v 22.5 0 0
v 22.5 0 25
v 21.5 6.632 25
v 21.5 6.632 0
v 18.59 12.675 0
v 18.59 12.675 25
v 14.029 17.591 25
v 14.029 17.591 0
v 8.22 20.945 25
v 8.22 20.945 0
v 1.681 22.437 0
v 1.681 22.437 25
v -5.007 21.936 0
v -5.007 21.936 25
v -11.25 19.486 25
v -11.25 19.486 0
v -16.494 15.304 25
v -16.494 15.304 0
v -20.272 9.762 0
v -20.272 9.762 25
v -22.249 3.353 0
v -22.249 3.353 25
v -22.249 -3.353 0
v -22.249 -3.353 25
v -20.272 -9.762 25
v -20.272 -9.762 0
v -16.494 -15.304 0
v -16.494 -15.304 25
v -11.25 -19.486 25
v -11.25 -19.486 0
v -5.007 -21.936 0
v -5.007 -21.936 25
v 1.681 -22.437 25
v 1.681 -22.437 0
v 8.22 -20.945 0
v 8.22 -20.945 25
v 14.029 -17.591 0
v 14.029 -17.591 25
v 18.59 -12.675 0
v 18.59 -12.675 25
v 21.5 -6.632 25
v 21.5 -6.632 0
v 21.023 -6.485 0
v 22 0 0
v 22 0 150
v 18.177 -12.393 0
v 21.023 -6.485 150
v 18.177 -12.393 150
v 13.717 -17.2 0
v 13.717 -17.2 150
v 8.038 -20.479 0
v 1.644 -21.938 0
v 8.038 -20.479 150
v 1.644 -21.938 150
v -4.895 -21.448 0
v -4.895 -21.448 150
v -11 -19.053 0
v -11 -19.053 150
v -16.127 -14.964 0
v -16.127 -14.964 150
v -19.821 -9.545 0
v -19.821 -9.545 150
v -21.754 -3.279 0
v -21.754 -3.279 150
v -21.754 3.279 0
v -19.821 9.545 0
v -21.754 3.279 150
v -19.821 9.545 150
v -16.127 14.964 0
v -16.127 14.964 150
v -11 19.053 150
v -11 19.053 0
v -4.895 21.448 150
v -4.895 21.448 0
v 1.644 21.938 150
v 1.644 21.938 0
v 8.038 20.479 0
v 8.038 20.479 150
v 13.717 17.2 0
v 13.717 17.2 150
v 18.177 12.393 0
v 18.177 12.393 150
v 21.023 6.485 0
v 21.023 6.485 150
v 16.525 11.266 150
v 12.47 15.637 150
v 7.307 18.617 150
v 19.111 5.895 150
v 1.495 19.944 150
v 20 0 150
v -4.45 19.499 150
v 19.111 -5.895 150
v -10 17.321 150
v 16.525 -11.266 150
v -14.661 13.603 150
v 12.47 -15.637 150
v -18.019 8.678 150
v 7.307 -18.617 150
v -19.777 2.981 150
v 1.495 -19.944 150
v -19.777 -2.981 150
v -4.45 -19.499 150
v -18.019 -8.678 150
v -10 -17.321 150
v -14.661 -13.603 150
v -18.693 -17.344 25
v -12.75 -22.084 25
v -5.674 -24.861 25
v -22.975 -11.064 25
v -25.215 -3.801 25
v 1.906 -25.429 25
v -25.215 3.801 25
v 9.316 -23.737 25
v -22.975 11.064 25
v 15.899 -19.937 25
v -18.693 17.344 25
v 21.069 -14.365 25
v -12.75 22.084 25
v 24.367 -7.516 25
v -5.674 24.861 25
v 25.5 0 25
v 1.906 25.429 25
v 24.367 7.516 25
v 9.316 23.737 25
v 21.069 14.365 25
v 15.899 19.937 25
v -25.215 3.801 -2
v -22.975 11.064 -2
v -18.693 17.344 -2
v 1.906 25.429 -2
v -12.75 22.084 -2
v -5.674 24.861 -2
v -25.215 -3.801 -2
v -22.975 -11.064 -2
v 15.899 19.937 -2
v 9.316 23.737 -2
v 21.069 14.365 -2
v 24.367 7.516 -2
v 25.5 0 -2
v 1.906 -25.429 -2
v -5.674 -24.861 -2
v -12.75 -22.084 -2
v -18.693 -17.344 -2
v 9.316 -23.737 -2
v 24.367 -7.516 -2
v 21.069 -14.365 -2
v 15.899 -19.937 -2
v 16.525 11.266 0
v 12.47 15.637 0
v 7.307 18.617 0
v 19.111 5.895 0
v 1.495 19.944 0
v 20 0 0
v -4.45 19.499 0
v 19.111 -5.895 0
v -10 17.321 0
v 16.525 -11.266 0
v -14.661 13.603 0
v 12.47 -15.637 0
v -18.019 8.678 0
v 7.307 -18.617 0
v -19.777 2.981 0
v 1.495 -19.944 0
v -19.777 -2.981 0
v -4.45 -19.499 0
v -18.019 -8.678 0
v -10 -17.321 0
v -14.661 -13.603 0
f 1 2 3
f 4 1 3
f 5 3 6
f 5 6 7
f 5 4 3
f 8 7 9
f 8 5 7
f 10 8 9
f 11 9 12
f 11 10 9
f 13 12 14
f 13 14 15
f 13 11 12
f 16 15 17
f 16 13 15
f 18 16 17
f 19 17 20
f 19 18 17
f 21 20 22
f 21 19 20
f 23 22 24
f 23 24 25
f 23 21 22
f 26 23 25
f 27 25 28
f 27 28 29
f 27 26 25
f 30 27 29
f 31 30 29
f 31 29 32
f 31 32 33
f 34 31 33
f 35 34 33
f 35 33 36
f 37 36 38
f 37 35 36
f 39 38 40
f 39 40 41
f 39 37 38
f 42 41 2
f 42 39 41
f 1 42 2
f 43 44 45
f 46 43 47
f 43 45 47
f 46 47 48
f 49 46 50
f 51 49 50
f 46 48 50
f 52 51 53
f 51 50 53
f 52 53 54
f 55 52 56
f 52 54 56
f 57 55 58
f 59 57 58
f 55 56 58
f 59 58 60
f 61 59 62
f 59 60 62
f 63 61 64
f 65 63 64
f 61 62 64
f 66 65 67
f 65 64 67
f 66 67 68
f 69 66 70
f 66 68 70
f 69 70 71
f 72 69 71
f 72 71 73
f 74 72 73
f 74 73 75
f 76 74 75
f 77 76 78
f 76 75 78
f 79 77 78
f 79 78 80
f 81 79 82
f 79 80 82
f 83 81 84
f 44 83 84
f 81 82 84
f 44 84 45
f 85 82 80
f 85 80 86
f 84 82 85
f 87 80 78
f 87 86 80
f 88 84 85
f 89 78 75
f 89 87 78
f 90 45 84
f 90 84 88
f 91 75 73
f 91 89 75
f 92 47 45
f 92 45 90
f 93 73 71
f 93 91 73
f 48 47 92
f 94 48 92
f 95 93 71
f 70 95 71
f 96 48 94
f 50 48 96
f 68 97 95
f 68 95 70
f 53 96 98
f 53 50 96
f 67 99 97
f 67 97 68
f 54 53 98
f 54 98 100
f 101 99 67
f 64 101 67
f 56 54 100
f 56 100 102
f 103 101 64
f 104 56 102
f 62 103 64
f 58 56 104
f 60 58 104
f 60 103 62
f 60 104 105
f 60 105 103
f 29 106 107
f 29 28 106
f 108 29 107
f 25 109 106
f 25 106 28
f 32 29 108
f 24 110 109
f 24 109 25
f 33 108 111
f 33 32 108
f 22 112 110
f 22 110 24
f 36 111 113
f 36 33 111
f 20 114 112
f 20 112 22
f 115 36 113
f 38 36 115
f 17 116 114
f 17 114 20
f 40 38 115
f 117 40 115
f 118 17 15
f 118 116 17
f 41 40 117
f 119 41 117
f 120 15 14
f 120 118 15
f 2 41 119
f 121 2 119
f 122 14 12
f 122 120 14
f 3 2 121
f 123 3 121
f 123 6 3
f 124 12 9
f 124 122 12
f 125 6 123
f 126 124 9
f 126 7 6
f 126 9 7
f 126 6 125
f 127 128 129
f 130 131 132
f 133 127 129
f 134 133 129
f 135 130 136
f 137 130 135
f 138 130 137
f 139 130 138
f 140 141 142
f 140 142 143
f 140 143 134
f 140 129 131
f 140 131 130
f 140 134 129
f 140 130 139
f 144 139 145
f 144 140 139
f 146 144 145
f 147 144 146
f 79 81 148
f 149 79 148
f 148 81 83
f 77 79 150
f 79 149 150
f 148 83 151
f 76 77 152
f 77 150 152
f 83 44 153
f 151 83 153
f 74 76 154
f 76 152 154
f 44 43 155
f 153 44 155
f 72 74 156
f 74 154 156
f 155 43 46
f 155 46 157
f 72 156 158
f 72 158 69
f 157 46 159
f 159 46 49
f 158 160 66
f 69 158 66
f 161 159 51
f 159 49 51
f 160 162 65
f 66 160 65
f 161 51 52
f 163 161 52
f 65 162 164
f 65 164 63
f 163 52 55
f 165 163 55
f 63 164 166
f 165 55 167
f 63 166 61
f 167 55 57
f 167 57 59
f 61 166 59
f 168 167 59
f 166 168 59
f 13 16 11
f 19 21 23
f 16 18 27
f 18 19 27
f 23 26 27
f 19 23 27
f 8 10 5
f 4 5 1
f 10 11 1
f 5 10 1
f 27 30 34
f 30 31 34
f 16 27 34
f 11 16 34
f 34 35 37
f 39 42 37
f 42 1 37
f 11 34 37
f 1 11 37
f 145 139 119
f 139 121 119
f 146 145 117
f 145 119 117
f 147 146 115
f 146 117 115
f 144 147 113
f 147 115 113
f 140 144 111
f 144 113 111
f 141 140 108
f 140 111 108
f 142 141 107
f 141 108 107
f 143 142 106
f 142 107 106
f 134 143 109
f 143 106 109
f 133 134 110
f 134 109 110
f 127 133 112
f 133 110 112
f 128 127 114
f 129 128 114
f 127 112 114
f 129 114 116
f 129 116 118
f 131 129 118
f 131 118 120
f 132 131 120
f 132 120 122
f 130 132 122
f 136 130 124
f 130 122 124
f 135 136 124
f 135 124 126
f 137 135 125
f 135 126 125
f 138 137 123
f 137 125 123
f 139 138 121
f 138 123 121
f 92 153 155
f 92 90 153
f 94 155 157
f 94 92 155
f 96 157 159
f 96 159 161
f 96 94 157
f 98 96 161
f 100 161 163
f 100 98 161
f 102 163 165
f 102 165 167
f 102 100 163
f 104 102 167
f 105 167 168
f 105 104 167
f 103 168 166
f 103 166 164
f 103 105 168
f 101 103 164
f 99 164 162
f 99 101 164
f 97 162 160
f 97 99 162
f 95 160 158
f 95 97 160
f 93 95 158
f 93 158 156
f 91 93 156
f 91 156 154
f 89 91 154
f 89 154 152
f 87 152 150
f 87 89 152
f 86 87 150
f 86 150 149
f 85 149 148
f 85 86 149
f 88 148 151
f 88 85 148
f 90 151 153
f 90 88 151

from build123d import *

# Parameters (mm, degrees)
F0_W     = 2
F0_H     = 150
F3_R     = 25.5
F3_R_2   = 22.5
F4_DEPTH = 25
F5_R     = 25.5
F6_DEPTH = 2


with BuildPart() as f1:
    # F0 (on Front) → F1 (revolve)
    with BuildSketch(Plane.XZ):
        with Locations((21, 75)):
            Rectangle(F0_W, F0_H)
    revolve(axis=Axis((0, 0, -12.3759636598), (0, 0, -1)))


with BuildPart() as f4:
    # F3 (on Top) → F4 (new body)
    with BuildSketch(Plane.XY):
        Circle(F3_R)
        Circle(F3_R_2, mode=Mode.SUBTRACT)
    extrude(amount=F4_DEPTH)

    # F5 (on face) → F6 (join)
    with BuildSketch(Plane(origin=(0, 0, 0), x_dir=(1, 0, 0), z_dir=(0, 0, -1))):
        Circle(F5_R)
    extrude(amount=F6_DEPTH)


solid = Compound([f1.part, f4.part])
